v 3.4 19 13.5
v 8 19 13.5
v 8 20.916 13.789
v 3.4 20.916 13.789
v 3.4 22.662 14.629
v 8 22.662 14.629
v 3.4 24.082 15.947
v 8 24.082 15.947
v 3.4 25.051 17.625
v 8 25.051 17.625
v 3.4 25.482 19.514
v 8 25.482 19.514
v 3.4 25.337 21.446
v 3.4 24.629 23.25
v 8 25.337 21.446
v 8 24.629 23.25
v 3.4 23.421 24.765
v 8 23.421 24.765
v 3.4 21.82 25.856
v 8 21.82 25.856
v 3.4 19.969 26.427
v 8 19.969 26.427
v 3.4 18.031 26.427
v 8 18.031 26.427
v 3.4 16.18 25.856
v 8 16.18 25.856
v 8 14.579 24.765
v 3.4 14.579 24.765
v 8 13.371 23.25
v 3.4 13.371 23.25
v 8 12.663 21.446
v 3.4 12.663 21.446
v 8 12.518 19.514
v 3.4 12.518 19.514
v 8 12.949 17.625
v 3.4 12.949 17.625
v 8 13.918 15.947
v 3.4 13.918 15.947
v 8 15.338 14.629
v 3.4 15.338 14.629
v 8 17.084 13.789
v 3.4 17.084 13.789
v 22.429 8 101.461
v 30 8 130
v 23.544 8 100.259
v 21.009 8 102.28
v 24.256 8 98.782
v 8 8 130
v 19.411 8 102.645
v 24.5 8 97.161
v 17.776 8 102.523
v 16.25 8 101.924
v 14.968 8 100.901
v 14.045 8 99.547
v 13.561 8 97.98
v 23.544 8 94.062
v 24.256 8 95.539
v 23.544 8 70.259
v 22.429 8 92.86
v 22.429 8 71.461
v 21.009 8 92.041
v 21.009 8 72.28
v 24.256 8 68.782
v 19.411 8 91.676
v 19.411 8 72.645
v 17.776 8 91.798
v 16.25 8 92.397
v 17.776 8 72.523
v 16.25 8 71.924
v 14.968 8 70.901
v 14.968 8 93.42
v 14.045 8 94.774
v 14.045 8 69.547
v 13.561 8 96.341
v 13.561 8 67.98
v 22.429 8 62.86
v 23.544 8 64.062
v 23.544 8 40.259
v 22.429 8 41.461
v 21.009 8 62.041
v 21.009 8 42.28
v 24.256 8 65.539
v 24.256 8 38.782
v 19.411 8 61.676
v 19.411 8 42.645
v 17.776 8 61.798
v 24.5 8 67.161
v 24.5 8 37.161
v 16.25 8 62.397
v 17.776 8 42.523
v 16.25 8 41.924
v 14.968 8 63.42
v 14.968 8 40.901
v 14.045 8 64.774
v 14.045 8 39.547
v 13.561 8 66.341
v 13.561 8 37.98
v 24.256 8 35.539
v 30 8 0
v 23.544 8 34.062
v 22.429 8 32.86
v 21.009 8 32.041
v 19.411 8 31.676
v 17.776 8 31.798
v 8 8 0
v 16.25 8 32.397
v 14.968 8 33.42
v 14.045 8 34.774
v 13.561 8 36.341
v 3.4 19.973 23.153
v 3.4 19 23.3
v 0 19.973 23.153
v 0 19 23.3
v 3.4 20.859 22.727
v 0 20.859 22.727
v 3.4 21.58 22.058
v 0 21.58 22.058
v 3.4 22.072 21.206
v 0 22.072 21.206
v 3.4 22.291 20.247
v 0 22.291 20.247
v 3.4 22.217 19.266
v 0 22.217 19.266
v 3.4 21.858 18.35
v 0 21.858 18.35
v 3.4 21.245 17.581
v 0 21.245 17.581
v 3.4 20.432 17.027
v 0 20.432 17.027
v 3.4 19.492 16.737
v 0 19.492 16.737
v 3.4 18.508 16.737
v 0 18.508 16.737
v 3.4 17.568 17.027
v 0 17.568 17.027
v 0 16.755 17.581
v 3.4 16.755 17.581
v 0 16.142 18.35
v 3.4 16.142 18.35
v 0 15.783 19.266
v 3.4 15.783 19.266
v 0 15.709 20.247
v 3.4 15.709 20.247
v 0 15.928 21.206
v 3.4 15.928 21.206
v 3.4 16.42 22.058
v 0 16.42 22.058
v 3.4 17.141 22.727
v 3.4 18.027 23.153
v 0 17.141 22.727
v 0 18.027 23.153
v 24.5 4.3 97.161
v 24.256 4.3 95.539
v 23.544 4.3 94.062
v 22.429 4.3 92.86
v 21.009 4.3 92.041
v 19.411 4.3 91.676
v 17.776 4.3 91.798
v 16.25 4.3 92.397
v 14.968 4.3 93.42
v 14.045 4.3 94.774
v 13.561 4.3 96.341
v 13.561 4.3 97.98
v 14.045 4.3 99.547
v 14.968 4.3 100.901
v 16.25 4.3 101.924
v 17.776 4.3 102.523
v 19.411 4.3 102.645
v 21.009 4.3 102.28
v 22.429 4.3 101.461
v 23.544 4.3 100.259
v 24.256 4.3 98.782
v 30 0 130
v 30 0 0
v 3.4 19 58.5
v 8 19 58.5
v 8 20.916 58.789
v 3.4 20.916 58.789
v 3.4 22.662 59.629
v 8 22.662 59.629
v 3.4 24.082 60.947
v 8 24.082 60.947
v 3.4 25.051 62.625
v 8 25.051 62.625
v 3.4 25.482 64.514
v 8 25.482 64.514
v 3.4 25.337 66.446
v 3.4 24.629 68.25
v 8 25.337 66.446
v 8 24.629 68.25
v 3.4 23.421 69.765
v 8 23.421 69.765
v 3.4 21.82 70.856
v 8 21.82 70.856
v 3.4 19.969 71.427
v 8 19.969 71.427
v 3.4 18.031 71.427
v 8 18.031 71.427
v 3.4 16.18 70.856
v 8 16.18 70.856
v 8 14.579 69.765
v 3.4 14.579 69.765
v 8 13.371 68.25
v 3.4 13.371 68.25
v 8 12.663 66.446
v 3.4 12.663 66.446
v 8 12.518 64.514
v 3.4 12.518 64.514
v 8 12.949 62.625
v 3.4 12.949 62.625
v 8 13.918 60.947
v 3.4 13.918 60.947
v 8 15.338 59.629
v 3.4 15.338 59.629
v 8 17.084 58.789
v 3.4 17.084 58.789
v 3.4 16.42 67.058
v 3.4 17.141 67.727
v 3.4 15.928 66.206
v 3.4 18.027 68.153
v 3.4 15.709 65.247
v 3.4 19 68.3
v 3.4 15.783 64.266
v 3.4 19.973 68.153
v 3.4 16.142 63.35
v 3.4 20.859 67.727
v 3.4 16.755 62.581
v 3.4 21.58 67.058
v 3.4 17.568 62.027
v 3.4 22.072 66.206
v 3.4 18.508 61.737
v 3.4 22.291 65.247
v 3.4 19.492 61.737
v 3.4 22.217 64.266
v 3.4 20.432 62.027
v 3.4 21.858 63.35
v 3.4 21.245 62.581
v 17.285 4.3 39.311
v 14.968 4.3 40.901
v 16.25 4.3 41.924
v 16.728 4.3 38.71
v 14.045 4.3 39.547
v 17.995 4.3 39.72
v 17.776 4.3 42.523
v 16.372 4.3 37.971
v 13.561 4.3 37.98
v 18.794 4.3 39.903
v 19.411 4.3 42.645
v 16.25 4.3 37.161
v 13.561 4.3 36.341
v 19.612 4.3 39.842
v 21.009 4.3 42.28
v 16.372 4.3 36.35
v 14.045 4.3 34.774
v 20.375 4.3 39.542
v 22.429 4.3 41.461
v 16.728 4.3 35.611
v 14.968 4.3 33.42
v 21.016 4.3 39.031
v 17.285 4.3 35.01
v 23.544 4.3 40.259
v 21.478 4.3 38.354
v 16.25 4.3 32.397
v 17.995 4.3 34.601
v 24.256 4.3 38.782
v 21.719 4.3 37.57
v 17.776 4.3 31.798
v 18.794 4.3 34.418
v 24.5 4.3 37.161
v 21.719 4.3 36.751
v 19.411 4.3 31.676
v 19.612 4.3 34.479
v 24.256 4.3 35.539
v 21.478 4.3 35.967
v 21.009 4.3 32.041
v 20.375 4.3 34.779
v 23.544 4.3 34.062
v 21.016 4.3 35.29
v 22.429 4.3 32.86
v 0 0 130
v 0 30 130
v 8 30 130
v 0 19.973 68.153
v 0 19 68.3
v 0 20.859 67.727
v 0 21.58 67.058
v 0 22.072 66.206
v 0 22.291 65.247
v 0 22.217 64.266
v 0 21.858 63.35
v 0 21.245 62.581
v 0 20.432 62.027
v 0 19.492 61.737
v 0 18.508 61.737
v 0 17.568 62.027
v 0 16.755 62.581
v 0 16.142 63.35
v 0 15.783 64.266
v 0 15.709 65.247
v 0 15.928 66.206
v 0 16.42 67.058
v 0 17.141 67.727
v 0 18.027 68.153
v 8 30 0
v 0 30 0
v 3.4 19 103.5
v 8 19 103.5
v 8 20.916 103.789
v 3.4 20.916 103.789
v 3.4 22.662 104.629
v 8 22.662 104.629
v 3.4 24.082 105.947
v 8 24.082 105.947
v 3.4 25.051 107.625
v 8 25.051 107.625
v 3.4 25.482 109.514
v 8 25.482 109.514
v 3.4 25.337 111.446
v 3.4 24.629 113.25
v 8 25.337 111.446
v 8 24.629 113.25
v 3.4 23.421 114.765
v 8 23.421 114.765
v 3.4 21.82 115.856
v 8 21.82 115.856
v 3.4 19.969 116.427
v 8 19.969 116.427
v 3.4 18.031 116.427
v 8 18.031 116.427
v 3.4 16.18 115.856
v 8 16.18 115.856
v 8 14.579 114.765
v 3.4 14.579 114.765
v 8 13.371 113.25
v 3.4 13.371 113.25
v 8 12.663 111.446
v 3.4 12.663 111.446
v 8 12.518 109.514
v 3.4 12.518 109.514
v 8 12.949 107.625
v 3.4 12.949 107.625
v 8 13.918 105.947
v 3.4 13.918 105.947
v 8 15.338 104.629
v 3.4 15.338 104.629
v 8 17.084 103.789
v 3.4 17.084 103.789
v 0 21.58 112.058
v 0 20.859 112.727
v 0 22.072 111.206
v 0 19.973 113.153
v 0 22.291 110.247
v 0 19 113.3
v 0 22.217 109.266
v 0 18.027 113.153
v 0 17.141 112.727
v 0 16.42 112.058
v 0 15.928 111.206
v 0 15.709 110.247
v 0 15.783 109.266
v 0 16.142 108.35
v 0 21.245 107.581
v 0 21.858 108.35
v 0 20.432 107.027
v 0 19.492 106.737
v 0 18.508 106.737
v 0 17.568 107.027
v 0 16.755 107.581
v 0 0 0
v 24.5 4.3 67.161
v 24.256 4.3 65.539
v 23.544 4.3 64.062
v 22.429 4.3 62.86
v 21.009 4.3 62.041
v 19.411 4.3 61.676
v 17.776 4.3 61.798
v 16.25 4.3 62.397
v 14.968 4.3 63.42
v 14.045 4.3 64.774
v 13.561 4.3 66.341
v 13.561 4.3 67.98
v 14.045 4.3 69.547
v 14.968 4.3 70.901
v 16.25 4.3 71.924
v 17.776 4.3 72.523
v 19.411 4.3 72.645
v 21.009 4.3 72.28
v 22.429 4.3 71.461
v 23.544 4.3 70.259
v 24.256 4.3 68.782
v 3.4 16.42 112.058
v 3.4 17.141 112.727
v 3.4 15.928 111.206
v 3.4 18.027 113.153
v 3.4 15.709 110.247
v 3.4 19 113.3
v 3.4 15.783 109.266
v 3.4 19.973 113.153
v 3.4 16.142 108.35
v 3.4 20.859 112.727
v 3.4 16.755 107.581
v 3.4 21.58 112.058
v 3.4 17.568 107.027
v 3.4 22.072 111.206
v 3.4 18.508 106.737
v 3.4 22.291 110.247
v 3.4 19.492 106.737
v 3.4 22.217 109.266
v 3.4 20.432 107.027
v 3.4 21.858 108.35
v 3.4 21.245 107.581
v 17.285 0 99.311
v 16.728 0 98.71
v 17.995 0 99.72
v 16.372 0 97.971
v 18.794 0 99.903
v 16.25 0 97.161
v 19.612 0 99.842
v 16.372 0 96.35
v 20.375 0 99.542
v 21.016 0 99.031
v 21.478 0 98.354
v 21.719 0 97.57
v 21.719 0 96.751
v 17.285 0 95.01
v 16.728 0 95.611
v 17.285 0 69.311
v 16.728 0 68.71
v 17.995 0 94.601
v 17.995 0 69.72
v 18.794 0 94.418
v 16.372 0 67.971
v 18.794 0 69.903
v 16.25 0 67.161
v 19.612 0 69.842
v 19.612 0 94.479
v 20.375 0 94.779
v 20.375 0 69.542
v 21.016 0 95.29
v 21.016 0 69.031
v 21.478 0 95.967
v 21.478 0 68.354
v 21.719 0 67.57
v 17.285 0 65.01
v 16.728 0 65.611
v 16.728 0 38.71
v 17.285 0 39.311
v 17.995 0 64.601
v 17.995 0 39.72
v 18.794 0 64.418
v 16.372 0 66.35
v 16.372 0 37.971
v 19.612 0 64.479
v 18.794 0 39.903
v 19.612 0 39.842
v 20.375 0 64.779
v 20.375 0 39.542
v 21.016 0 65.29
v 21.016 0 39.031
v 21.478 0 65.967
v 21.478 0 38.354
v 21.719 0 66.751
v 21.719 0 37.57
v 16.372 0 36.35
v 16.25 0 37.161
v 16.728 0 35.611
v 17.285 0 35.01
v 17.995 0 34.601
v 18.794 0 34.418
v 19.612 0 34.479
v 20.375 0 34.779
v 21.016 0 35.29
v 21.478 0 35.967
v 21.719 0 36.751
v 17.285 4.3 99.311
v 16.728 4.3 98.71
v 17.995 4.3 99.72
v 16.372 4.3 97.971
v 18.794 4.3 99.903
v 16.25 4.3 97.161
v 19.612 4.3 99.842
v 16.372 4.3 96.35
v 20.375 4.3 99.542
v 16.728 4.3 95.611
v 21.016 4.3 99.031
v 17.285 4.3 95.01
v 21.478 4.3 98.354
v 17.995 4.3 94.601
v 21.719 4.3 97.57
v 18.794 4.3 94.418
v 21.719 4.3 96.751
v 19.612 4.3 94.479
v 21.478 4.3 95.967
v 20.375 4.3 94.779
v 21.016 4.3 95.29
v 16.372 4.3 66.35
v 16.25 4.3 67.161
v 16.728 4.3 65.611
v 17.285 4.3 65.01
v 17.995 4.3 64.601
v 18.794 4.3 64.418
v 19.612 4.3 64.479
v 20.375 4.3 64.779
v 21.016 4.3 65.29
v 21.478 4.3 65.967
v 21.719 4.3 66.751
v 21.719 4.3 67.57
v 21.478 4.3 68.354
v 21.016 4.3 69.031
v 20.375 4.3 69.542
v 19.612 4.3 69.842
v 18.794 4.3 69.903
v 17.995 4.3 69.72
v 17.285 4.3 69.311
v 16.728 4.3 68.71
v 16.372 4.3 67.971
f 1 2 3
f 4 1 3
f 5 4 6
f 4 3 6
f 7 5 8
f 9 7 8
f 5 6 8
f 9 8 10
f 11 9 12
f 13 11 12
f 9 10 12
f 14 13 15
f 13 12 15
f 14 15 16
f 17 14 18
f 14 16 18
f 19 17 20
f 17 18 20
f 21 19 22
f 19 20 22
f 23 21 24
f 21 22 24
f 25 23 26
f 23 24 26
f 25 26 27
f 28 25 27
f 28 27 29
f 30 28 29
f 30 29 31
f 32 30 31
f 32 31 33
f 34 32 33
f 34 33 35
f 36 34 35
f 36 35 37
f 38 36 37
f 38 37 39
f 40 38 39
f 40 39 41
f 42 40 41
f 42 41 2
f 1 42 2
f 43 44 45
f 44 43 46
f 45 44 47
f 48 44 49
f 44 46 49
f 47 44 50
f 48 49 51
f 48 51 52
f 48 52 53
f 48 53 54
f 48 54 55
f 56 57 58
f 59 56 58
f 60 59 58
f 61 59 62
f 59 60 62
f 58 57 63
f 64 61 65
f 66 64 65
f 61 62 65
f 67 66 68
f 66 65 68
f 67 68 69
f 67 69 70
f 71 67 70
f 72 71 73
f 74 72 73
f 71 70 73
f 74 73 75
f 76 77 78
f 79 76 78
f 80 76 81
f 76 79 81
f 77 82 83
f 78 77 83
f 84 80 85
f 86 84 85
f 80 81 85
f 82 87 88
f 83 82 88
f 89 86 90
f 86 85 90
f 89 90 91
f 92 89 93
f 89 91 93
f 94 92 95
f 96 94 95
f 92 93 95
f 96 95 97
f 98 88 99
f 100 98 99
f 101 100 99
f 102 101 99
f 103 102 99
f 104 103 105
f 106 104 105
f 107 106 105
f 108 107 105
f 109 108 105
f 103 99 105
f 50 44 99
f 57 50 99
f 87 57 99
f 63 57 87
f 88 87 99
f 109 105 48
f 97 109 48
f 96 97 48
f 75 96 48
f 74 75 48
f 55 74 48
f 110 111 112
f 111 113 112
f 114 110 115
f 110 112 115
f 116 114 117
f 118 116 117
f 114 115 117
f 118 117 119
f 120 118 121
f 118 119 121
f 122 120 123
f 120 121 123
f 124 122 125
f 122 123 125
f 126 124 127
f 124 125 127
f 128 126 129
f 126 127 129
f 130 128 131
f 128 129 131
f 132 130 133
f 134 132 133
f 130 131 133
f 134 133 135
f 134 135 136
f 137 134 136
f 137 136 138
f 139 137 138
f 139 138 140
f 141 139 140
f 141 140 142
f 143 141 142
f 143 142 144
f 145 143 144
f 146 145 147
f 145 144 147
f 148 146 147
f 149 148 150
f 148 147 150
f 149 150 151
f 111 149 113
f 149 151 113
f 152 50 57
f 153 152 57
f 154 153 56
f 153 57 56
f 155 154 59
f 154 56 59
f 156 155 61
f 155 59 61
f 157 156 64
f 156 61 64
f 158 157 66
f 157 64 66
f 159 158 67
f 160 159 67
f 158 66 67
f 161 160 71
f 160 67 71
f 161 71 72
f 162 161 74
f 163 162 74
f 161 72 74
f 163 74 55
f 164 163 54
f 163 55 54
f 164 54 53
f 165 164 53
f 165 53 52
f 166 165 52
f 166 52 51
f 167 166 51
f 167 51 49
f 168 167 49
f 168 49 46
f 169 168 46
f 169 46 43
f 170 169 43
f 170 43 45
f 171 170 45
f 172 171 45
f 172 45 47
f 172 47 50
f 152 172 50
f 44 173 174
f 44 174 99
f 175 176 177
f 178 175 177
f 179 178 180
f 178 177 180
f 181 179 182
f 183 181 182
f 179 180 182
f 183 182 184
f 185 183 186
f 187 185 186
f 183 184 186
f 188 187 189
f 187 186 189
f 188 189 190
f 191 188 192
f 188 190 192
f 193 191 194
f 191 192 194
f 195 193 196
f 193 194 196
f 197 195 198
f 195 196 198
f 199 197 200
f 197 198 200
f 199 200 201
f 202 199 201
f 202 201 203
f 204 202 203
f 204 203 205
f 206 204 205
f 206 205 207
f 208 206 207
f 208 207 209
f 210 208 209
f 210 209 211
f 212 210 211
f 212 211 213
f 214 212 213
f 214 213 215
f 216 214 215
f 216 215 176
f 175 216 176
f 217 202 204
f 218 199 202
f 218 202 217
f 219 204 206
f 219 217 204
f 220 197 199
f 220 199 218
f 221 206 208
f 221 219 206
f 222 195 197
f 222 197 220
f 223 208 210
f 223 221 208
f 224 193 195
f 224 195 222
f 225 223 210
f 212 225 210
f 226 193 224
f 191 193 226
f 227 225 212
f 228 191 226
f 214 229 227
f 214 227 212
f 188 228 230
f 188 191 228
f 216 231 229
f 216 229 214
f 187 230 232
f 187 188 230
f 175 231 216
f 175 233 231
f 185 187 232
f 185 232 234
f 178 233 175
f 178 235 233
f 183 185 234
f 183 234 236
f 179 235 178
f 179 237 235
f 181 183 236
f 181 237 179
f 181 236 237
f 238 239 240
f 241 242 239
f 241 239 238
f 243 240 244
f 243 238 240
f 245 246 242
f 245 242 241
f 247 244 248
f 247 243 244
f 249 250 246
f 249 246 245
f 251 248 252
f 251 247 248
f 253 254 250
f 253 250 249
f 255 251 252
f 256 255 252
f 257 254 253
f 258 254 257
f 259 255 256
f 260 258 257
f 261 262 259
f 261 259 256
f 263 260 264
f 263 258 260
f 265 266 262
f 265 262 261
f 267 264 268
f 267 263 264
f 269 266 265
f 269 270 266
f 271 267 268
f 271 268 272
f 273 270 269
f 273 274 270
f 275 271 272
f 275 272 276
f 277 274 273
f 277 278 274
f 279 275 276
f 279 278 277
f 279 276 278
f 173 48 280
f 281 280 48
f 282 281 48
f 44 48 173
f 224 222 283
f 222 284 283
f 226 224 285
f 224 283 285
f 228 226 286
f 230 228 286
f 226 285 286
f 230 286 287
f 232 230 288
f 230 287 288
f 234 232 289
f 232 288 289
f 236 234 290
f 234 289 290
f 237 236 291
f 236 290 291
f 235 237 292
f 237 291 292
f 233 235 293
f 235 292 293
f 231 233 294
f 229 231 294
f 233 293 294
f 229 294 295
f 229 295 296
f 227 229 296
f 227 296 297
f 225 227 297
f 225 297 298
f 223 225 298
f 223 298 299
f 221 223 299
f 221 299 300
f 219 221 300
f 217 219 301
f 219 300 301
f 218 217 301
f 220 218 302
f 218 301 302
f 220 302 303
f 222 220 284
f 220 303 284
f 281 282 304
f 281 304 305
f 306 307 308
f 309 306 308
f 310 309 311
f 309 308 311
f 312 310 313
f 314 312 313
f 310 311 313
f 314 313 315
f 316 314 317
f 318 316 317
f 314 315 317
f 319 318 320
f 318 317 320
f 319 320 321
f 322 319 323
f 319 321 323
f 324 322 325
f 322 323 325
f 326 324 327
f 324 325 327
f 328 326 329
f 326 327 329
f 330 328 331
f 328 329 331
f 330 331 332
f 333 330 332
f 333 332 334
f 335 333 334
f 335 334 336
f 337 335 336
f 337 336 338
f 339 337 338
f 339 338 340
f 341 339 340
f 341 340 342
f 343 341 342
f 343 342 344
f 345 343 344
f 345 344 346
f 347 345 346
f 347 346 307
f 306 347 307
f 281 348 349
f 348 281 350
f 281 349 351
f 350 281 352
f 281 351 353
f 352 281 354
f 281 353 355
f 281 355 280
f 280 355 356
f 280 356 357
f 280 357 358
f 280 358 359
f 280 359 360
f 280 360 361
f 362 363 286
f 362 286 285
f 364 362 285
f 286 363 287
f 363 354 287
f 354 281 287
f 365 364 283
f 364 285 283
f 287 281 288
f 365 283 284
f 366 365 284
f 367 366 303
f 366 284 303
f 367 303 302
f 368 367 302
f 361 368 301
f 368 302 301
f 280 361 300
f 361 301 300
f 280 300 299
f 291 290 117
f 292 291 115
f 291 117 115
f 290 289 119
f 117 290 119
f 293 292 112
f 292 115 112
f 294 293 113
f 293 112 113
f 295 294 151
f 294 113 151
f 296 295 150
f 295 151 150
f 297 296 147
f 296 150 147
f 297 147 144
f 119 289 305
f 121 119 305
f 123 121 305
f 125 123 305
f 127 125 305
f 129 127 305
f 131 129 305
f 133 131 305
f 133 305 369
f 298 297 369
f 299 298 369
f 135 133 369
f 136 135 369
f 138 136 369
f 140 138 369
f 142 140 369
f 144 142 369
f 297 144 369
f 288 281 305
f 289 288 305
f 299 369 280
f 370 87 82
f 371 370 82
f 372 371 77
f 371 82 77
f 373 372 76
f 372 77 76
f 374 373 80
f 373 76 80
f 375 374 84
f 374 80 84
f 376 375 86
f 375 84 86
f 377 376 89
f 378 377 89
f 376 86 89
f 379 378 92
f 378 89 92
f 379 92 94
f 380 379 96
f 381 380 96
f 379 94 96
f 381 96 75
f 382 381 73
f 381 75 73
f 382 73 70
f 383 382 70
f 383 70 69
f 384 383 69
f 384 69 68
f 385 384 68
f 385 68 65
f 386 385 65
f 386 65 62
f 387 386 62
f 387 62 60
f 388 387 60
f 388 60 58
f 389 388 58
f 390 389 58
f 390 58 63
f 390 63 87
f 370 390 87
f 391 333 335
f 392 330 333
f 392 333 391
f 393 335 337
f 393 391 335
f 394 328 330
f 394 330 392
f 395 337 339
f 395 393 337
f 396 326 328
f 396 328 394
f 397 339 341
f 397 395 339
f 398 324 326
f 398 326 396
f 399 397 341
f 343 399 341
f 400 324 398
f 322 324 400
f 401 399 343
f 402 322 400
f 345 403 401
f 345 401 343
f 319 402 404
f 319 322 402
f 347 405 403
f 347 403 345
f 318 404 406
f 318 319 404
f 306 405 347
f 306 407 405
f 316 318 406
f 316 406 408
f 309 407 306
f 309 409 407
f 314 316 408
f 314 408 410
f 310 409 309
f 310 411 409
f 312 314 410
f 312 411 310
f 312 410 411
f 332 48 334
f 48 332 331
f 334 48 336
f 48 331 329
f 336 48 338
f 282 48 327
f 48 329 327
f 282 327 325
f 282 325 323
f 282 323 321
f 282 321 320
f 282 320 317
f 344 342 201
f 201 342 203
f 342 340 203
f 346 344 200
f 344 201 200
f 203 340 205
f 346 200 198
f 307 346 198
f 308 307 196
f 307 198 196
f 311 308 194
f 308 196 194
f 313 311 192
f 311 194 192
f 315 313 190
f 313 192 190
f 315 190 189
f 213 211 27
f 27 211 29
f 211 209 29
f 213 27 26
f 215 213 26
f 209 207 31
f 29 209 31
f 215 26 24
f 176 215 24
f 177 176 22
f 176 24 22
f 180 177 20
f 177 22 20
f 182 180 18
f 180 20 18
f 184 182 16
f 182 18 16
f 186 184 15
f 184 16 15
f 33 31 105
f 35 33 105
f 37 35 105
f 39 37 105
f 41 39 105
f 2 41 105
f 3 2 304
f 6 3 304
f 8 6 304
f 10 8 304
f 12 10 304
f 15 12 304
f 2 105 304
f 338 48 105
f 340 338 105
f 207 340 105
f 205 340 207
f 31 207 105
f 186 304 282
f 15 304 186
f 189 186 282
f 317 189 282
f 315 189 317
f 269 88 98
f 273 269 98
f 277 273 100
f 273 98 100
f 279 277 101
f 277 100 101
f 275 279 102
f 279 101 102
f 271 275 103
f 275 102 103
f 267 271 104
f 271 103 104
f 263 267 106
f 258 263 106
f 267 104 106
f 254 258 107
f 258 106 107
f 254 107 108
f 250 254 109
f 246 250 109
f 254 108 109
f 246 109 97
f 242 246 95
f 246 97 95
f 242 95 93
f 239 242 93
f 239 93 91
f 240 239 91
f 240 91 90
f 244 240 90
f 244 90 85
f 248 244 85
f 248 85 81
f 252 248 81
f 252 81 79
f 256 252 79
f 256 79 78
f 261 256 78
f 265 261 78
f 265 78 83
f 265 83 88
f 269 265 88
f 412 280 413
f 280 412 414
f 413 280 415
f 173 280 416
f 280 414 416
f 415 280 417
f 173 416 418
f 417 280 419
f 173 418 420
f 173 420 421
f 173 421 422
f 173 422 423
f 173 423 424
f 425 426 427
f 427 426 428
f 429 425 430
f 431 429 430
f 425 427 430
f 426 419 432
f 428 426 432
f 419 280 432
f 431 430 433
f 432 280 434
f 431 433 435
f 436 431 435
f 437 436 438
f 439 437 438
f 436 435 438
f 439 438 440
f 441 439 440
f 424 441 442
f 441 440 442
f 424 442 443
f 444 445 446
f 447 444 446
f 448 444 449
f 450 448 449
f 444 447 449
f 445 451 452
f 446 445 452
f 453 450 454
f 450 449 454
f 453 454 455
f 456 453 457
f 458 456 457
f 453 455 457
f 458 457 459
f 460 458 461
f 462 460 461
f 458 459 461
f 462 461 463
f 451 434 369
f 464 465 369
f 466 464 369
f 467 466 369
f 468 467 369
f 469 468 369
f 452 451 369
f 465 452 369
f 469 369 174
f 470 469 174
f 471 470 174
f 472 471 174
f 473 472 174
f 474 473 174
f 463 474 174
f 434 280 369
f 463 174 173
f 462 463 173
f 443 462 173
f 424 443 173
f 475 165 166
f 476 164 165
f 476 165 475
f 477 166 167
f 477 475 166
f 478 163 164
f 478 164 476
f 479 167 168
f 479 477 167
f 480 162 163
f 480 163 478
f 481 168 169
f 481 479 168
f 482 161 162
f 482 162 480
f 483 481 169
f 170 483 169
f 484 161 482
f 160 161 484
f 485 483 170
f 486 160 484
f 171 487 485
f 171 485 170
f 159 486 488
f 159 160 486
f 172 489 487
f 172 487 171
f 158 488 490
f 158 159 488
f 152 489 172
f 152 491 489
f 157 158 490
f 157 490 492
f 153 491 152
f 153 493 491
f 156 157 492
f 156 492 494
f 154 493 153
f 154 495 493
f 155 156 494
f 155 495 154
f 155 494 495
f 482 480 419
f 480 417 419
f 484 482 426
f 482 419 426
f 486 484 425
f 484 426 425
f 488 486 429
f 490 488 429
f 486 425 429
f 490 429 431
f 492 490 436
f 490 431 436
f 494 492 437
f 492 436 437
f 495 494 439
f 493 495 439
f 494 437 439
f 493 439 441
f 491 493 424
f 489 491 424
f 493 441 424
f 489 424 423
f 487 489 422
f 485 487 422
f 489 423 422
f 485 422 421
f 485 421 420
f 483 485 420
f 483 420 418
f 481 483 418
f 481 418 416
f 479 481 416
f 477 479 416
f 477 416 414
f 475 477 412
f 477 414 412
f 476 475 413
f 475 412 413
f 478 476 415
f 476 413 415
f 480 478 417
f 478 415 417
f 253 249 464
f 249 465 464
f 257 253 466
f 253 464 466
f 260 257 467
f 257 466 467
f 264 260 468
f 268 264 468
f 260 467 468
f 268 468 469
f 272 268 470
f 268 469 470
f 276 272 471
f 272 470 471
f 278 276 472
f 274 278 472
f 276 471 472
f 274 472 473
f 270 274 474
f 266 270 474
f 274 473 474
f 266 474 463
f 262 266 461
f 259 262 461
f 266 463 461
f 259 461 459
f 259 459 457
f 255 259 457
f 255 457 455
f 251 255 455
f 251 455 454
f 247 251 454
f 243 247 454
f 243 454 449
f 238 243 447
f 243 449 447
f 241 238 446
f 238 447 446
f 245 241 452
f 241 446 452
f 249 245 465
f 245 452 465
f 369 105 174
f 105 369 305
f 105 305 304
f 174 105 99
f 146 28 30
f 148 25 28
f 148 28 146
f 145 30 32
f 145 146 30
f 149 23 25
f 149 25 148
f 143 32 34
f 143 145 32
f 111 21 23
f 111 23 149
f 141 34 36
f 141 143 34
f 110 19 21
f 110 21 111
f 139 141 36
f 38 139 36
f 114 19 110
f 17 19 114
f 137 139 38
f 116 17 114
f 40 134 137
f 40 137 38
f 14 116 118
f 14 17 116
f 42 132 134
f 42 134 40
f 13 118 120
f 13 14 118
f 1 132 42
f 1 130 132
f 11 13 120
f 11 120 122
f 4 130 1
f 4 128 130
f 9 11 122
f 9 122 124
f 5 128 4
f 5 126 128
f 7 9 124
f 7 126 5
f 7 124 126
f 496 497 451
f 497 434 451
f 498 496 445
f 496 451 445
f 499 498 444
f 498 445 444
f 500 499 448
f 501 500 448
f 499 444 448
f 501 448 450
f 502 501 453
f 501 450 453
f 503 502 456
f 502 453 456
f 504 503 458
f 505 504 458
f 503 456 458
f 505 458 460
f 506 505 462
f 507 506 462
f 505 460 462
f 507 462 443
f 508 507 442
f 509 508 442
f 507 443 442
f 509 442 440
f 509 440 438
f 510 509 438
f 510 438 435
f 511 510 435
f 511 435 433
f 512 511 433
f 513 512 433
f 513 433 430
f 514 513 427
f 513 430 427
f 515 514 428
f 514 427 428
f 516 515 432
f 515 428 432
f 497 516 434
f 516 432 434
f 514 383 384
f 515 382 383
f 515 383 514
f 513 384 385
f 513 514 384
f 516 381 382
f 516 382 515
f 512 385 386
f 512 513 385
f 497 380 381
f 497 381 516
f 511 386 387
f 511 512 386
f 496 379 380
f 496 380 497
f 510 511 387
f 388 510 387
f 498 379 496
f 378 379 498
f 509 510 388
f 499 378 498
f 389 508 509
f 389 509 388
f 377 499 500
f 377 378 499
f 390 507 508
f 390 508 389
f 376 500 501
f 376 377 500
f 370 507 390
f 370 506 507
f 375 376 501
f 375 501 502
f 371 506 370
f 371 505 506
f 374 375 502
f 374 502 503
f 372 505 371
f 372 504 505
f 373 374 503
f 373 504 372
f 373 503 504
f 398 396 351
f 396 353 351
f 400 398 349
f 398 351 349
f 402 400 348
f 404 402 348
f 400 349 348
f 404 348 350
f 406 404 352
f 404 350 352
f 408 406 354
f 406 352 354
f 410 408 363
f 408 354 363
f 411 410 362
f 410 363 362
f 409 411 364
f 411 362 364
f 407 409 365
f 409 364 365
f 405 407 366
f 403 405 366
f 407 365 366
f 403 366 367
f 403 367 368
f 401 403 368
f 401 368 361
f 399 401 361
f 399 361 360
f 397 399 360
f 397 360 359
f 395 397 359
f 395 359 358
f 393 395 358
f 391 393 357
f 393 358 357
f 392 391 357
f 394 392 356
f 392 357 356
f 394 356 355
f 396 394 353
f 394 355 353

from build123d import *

# Parameters (mm, degrees)
BOSS_EXTRUDE1_DEPTH                      = 130
CBORE_FOR_M5_PAN_HEAD_SCREW1_D           = 5.5
CBORE_FOR_M5_PAN_HEAD_SCREW1_CBORE_D     = 11
CBORE_FOR_M5_PAN_HEAD_SCREW1_CBORE_DEPTH = 3.7
CBORE_FOR_M6_PAN_HEAD_SCREW1_D           = 6.6
CBORE_FOR_M6_PAN_HEAD_SCREW1_CBORE_D     = 13
CBORE_FOR_M6_PAN_HEAD_SCREW1_CBORE_DEPTH = 4.6


with BuildPart() as part:
    # Sketch1 → Boss-Extrude1 (new body)
    with BuildSketch(Plane.XY):
        Polygon((0, 8), (0, 0), (8, 0), (30, 0), (30, 8), (8, 8), (8, 30), (0, 30), align=None)
    extrude(amount=BOSS_EXTRUDE1_DEPTH)

    # CBORE for M5 Pan Head Screw1 (through all)
    with Locations(Plane(origin=(0, 8, 0), x_dir=(1, 0, 0), z_dir=(0, 1, 0))):
        with Locations((19, -67.160533678), (19, -37.160533678), (19, -97.160533678)):
            CounterBoreHole(CBORE_FOR_M5_PAN_HEAD_SCREW1_D / 2, CBORE_FOR_M5_PAN_HEAD_SCREW1_CBORE_D / 2, CBORE_FOR_M5_PAN_HEAD_SCREW1_CBORE_DEPTH)

    # CBORE for M6 Pan Head Screw1 (through all)
    with Locations(Plane(origin=(8, 0, 0), x_dir=(0, 0, -1), z_dir=(1, 0, 0))):
        with Locations((-110, 19), (-65, 19), (-20, 19)):
            CounterBoreHole(CBORE_FOR_M6_PAN_HEAD_SCREW1_D / 2, CBORE_FOR_M6_PAN_HEAD_SCREW1_CBORE_D / 2, CBORE_FOR_M6_PAN_HEAD_SCREW1_CBORE_DEPTH)


solid = part.part
